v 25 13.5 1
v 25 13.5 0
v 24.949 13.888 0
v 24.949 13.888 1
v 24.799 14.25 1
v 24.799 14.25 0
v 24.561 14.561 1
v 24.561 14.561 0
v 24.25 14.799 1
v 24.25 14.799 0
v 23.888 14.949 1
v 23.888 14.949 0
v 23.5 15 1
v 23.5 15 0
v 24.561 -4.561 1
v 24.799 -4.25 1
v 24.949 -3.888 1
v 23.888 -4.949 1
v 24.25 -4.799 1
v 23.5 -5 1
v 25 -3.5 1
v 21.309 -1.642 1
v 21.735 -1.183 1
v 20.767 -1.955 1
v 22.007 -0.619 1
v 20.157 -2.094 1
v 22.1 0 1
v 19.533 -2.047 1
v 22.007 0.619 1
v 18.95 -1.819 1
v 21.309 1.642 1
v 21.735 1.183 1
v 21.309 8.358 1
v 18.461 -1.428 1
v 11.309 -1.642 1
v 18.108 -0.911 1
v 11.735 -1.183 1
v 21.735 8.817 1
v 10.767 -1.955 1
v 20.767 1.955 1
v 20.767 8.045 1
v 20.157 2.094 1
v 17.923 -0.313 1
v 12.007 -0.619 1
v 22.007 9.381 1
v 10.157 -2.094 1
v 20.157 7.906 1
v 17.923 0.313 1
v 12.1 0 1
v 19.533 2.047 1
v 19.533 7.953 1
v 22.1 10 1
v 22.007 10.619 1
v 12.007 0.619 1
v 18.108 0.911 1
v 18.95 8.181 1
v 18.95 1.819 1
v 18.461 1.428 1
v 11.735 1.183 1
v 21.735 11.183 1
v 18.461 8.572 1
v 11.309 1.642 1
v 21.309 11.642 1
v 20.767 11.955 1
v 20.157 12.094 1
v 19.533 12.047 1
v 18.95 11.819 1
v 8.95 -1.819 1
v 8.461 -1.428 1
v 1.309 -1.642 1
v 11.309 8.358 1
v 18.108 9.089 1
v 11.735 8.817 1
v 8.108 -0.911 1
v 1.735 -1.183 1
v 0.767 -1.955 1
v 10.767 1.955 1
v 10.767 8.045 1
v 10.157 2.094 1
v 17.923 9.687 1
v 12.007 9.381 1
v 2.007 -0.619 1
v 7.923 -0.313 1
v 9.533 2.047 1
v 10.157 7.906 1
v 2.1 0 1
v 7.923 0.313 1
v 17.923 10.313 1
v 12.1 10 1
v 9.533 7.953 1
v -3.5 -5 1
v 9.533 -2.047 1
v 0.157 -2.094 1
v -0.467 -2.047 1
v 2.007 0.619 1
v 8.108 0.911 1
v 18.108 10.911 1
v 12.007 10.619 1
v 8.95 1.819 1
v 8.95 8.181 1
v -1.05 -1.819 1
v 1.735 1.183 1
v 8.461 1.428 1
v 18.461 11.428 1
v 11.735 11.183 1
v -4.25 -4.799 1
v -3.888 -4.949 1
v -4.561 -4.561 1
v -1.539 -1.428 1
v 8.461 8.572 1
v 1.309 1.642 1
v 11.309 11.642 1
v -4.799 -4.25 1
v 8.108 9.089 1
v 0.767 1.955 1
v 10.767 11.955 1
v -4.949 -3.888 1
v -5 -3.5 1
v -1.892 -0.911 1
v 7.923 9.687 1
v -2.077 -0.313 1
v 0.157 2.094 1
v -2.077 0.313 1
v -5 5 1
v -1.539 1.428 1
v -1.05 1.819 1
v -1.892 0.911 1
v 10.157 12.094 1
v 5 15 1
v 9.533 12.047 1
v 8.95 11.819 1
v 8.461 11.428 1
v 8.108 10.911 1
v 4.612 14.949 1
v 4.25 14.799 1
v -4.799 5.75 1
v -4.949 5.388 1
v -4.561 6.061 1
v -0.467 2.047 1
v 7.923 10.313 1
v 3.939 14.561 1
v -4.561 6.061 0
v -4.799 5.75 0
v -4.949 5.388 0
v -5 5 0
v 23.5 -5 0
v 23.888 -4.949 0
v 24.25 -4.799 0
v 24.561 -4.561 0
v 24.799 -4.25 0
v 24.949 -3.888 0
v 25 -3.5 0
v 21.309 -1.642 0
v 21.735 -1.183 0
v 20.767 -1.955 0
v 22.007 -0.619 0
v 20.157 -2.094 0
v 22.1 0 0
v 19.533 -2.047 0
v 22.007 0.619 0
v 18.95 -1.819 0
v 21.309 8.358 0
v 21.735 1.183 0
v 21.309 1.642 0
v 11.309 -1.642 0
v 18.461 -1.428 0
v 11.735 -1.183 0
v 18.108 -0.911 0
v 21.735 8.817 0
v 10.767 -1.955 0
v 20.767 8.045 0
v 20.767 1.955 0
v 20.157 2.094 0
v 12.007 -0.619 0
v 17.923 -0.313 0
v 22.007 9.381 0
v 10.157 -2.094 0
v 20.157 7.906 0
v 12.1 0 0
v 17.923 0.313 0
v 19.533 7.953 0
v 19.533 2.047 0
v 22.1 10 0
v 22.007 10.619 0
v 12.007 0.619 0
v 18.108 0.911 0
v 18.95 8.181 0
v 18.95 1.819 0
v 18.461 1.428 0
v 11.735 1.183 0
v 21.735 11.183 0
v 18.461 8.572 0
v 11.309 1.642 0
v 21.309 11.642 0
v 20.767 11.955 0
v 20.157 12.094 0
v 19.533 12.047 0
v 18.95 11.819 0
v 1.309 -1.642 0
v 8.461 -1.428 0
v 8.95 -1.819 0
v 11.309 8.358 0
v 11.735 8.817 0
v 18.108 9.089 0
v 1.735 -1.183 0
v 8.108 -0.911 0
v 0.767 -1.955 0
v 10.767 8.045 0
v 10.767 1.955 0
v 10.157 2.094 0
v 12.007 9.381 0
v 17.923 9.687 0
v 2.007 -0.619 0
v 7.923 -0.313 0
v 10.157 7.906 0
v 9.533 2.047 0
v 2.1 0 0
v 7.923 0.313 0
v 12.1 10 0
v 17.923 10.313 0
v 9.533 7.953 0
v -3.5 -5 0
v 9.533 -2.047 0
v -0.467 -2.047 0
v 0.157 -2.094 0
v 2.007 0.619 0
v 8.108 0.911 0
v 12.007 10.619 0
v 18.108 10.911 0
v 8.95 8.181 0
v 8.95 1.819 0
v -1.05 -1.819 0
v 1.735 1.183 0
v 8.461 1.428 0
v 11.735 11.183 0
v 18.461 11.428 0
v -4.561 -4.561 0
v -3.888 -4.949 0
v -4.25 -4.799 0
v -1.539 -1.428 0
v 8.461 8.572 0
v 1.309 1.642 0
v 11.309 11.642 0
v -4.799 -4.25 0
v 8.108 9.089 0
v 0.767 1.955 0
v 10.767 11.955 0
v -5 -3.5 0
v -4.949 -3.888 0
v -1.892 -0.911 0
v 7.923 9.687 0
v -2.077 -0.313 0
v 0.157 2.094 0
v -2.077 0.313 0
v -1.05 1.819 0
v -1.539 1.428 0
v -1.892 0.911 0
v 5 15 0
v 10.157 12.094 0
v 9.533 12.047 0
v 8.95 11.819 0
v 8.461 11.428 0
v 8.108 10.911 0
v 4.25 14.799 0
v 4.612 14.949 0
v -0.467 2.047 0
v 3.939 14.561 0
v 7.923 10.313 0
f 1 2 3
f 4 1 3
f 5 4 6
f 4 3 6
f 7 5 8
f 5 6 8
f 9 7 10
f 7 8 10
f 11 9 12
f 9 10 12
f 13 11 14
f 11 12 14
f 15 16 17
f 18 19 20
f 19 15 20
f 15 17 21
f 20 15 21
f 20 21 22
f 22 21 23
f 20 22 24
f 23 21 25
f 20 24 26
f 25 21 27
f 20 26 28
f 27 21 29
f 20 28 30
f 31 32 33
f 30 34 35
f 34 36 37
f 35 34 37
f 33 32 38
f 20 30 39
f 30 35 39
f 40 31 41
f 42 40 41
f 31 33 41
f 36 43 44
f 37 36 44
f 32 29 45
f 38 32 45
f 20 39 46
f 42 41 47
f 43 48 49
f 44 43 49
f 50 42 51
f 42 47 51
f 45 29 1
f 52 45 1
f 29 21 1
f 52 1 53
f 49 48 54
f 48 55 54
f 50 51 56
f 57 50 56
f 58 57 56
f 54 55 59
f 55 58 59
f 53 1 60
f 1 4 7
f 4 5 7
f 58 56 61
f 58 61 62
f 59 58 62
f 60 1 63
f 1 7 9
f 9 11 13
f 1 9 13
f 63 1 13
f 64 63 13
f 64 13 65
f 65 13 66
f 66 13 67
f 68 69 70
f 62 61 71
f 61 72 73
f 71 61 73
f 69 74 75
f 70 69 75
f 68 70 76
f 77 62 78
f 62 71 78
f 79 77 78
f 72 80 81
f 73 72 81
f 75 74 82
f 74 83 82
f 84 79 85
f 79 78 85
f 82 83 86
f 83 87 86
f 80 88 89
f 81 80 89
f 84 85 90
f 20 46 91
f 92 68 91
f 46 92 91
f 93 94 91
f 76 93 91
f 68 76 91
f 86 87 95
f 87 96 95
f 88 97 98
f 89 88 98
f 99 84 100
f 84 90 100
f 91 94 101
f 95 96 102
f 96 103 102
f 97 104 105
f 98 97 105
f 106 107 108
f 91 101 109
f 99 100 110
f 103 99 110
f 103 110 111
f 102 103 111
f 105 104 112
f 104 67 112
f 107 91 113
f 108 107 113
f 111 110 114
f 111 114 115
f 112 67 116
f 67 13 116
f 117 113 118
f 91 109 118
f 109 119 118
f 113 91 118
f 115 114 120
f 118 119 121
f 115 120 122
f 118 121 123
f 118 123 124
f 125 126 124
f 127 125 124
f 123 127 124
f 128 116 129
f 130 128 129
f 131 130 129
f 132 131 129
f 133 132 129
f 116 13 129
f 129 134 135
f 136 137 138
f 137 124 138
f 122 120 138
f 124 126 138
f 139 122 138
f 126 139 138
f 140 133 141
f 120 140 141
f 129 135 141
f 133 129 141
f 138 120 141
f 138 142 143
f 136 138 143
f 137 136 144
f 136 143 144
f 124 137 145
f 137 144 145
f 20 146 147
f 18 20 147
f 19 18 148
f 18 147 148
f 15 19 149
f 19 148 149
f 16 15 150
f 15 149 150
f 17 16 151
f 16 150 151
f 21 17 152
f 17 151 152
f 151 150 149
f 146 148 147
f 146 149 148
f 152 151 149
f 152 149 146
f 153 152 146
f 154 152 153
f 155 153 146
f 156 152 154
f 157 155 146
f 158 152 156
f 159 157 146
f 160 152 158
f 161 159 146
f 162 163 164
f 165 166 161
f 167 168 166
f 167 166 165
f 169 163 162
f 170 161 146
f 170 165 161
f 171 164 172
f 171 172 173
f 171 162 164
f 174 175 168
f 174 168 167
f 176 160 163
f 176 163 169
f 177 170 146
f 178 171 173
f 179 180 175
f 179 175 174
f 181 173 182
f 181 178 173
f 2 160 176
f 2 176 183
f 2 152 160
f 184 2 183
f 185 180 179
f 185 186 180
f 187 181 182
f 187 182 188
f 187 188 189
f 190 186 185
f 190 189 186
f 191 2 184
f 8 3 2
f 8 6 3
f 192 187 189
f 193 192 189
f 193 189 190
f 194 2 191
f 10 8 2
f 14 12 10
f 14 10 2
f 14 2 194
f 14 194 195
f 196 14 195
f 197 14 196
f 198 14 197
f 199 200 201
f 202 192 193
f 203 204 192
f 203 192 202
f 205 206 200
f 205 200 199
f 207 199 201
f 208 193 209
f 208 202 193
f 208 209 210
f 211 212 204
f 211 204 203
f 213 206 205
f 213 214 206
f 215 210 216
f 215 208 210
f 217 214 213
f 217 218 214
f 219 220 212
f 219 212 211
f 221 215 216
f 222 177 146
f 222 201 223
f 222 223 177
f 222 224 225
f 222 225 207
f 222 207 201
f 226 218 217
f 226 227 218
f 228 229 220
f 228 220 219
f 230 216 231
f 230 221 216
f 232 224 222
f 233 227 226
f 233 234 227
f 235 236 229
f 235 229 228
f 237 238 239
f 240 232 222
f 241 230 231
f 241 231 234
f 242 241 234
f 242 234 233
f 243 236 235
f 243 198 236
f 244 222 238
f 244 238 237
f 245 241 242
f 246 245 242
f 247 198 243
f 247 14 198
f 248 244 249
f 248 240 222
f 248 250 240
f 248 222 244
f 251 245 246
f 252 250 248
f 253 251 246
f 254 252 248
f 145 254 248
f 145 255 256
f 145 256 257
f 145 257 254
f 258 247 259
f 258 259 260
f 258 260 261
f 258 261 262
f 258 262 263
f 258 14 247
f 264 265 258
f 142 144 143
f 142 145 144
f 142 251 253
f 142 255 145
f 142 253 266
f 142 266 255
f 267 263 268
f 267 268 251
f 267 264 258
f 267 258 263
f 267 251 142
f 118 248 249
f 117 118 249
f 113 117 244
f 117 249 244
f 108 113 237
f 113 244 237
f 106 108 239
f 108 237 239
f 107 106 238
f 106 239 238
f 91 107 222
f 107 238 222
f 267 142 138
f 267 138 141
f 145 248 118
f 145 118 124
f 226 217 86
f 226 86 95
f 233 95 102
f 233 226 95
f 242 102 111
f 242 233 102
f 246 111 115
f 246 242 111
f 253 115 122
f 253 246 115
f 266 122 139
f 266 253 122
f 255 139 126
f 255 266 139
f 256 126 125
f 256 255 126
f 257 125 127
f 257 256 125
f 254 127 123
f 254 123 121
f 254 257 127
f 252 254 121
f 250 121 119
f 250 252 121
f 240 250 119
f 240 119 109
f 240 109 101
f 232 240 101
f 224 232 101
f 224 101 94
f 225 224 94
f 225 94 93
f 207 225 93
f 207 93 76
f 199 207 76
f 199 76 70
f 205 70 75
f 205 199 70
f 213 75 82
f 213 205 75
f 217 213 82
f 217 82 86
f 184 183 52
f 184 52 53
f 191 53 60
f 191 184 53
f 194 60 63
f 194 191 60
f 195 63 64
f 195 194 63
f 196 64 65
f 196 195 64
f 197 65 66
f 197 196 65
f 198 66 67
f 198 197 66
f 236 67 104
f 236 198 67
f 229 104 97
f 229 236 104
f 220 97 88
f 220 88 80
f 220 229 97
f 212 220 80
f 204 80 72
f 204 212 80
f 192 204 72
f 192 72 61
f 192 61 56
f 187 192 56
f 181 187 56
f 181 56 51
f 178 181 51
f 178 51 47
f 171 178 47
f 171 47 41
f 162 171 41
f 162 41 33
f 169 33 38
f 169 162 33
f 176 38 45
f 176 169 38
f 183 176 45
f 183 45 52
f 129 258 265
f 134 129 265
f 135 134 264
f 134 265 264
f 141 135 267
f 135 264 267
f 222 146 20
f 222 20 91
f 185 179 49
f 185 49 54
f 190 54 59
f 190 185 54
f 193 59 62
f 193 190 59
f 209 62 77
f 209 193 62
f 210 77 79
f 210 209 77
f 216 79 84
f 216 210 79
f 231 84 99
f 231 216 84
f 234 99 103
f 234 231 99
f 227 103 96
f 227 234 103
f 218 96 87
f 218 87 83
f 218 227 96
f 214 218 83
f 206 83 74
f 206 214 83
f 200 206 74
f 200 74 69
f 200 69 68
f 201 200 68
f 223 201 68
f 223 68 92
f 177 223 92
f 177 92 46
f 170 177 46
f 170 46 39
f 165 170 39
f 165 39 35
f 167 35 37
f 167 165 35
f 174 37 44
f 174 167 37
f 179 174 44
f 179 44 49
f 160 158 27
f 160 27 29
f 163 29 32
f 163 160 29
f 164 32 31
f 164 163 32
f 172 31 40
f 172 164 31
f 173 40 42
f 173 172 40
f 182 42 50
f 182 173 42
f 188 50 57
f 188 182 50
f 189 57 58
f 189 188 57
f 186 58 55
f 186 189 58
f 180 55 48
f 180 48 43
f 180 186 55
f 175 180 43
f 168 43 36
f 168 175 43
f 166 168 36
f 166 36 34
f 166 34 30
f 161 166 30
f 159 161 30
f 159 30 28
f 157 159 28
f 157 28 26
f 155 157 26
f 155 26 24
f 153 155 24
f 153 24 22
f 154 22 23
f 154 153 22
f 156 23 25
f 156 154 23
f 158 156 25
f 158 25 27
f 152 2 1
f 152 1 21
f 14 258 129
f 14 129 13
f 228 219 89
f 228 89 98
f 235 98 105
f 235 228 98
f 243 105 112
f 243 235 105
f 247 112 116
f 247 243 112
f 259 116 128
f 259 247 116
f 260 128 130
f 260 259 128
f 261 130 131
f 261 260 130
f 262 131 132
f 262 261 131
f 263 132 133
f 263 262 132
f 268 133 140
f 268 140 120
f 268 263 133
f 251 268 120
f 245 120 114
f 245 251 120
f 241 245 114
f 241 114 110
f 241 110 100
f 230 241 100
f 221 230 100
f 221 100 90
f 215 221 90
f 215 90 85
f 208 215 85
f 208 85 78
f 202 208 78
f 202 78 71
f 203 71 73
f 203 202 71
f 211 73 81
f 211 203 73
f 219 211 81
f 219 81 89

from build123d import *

# Parameters (mm, degrees)
SKETCH_R  = 2.1
PAD_DEPTH = 1


with BuildPart() as part:
    # Sketch → Pad (new body)
    with BuildSketch(Plane.XY):
        with BuildLine():
            Line((5, 15), (23.5, 15))
            ThreePointArc((25, 13.5), (24.56066, 14.56066), (23.5, 15))
            Line((25, 13.5), (25, -3.5))
            ThreePointArc((23.5, -5), (24.56066, -4.56066), (25, -3.5))
            Line((23.5, -5), (-3.5, -5))
            ThreePointArc((-5, -3.5), (-4.56066, -4.56066), (-3.5, -5))
            Line((-5, -3.5), (-5, 5))
            ThreePointArc((-4.56066, 6.06066), (-4.885819, 5.574025), (-5, 5))
            Line((-4.56066, 6.06066), (3.93934, 14.56066))
            ThreePointArc((5, 15), (4.425975, 14.885819), (3.93934, 14.56066))
        make_face()
        Circle(SKETCH_R, mode=Mode.SUBTRACT)
        with Locations((10, 0)):
            Circle(SKETCH_R, mode=Mode.SUBTRACT)
        with Locations((20, 0)):
            Circle(SKETCH_R, mode=Mode.SUBTRACT)
        with Locations((10, 10)):
            Circle(SKETCH_R, mode=Mode.SUBTRACT)
        with Locations((20, 10)):
            Circle(SKETCH_R, mode=Mode.SUBTRACT)
    extrude(amount=PAD_DEPTH)


solid = part.part
